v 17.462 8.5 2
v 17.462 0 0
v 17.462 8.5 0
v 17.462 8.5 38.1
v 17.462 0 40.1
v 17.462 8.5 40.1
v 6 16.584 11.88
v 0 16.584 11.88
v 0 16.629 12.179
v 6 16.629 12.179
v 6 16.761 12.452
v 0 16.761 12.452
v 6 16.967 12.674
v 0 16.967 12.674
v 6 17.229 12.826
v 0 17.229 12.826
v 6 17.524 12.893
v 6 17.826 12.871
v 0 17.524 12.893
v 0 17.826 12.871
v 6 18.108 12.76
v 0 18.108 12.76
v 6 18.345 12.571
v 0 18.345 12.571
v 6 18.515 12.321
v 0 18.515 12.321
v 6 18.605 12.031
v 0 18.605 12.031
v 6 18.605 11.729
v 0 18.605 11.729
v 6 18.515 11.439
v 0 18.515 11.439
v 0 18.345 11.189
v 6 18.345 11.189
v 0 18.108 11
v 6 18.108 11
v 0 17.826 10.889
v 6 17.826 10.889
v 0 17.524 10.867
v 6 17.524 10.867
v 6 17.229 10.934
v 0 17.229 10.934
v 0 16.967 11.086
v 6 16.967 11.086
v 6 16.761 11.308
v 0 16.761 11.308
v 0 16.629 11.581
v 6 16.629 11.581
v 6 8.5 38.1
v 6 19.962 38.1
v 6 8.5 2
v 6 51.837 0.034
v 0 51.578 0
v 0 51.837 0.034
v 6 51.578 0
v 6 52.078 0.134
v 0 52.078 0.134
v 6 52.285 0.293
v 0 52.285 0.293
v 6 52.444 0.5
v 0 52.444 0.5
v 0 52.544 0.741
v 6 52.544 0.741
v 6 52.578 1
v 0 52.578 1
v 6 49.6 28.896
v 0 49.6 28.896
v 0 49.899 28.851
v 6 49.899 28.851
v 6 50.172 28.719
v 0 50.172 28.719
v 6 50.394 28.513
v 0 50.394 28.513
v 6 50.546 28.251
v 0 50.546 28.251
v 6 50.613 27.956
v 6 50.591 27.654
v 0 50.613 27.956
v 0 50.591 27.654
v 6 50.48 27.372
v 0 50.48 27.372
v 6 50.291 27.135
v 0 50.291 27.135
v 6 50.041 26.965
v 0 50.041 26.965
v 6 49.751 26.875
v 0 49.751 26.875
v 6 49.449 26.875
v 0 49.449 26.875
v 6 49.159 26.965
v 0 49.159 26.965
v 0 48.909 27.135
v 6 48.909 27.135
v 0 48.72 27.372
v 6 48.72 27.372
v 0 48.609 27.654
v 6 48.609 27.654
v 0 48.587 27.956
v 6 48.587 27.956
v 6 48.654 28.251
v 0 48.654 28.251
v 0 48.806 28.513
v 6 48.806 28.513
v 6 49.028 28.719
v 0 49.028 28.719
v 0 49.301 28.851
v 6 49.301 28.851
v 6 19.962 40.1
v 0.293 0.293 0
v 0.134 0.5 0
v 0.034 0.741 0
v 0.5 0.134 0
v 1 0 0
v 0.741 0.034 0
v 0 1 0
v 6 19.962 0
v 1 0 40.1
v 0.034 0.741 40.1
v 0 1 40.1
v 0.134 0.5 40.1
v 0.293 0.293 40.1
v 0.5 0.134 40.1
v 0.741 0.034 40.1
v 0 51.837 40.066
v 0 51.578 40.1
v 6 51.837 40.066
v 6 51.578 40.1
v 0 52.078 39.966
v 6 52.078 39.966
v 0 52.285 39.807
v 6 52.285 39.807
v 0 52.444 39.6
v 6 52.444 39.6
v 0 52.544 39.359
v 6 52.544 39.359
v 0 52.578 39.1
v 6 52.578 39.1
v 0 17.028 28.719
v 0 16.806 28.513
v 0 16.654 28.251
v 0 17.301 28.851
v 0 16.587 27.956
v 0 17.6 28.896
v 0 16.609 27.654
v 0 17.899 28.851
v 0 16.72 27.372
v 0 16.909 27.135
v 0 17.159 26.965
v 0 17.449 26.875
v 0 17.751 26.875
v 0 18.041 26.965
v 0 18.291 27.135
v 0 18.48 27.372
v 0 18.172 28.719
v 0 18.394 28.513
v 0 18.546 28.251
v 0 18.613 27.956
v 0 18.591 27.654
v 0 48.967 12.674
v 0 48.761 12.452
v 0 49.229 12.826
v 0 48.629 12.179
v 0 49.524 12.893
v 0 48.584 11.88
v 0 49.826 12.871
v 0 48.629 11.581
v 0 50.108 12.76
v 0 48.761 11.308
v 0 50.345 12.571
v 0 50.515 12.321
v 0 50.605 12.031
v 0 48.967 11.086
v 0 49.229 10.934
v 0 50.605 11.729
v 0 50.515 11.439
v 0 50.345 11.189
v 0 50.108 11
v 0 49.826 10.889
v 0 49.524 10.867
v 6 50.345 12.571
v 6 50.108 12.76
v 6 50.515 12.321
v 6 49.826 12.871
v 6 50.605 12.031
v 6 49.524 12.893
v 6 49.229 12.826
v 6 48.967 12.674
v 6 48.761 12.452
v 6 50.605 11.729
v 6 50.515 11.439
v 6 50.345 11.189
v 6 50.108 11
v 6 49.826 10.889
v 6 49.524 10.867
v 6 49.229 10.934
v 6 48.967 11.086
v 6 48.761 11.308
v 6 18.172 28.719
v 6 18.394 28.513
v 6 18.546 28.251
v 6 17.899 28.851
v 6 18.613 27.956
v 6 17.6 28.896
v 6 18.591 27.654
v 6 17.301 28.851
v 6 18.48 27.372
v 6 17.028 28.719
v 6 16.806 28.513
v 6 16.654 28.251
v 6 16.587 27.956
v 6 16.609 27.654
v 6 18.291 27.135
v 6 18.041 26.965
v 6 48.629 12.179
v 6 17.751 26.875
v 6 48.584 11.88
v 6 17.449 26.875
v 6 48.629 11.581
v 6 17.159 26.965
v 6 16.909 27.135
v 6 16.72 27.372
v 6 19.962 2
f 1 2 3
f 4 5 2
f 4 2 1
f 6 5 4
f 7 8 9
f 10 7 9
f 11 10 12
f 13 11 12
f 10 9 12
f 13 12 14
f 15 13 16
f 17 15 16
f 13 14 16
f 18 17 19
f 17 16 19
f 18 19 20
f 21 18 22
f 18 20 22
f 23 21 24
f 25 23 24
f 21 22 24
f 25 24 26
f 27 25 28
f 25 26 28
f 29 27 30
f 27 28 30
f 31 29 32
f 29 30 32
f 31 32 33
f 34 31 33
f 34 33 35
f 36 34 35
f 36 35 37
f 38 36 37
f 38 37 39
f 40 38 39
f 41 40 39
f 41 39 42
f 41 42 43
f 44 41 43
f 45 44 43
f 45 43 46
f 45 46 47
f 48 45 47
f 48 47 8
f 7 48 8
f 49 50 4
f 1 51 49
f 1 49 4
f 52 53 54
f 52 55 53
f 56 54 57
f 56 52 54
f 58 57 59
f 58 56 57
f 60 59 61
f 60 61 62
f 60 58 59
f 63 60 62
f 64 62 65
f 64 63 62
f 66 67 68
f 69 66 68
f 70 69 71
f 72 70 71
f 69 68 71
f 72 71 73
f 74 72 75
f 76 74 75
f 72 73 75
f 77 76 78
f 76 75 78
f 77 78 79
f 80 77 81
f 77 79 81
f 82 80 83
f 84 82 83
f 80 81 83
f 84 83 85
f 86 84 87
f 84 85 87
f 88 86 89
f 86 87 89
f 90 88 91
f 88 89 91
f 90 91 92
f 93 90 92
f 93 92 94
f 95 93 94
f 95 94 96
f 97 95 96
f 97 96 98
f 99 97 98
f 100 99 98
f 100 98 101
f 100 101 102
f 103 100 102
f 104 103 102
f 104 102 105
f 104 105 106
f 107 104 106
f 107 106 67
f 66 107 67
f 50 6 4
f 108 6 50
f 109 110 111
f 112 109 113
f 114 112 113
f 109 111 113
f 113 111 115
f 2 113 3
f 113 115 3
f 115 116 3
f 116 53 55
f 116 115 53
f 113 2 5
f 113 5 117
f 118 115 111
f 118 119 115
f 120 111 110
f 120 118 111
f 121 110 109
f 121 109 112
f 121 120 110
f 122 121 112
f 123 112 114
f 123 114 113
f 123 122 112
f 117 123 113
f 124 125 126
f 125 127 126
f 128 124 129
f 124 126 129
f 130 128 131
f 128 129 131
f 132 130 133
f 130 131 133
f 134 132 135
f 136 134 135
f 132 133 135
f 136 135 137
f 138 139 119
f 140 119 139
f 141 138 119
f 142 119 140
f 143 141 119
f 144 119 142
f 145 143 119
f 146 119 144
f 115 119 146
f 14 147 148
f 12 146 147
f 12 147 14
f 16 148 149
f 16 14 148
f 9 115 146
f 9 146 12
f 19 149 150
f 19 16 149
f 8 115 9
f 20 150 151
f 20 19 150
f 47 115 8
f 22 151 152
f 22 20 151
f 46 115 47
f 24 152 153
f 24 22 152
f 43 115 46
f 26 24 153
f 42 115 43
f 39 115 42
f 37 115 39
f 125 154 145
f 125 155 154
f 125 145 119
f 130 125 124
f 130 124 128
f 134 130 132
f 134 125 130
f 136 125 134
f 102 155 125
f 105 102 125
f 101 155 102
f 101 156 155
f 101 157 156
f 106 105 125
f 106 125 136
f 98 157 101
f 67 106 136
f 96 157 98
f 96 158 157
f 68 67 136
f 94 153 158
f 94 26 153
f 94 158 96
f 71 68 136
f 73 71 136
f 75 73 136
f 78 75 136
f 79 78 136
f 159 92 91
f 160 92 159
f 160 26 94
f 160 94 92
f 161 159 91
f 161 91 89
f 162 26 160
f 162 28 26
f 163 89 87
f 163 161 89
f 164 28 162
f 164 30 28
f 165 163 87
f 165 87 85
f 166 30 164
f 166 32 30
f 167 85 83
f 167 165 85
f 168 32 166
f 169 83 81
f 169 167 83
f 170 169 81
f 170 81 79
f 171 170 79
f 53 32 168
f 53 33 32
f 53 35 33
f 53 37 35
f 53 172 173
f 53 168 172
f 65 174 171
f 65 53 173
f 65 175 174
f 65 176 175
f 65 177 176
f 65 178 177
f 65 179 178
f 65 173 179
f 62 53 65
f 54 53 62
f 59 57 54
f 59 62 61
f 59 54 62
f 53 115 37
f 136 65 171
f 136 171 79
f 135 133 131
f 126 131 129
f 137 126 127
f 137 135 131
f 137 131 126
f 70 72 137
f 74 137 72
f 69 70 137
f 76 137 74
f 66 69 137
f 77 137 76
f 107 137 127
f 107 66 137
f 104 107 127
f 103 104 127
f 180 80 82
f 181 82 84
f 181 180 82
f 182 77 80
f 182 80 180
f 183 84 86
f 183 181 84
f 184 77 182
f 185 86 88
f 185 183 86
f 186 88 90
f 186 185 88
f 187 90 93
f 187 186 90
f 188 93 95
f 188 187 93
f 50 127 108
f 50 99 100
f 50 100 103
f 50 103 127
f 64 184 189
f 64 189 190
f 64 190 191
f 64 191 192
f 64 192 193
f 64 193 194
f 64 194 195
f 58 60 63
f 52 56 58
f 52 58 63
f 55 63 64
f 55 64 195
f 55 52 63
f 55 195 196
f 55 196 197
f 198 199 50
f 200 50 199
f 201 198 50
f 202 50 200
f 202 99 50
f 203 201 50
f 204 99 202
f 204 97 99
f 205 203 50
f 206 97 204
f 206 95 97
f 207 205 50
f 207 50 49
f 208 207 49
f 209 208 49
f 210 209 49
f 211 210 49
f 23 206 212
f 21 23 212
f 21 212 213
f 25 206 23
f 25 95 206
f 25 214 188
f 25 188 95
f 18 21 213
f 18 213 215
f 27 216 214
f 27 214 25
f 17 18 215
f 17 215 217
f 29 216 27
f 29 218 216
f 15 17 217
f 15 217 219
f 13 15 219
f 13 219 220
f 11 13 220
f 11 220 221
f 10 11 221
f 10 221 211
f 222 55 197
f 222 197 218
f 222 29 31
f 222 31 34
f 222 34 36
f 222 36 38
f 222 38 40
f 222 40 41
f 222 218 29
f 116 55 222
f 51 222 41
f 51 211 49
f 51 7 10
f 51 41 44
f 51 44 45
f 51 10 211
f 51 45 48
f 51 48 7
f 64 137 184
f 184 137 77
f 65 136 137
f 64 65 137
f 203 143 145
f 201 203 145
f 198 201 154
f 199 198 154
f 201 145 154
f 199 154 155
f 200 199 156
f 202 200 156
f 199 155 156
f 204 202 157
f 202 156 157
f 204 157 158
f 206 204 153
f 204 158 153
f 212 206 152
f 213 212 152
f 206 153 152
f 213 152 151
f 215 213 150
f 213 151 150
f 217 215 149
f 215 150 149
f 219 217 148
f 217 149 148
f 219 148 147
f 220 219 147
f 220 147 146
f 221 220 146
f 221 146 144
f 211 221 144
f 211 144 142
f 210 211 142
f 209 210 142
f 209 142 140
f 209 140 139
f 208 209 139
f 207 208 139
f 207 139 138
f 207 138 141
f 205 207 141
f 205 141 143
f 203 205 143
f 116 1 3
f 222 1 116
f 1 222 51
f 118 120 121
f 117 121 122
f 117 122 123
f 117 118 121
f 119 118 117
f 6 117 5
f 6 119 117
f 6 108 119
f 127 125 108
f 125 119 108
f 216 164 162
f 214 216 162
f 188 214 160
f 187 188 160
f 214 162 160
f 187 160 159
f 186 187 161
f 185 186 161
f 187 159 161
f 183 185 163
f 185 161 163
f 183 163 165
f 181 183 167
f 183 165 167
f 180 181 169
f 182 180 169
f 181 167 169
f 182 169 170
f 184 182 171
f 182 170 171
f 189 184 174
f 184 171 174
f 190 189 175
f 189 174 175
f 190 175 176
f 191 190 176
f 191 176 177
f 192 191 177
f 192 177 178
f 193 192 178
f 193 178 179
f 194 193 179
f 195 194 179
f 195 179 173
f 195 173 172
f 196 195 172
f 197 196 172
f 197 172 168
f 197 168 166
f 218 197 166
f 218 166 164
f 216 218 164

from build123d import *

# Parameters (mm, degrees)
BOSS_EXTRUDE1_DEPTH = 40.1
SKETCH3_R           = 1.35
CUT_EXTRUDE2_DEPTH  = 50.8
SKETCH4_R           = 1.016
CUT_EXTRUDE3_DEPTH  = 50.8
SKETCH6_W           = 62.086073973
SKETCH6_H           = 34.1
CUT_EXTRUDE4_DEPTH  = 6
BOSS_EXTRUDE5_DEPTH = 2
FILLET1_R           = 1
CUT_EXTRUDE5_DEPTH  = 101.73954578


with BuildPart() as part:
    # Sketch1 → Boss-Extrude1 (new body)
    with BuildSketch(Plane.XY):
        Polygon((0, 0), (0, 52.578), (6, 52.578), (6, 8.5), (76, 8.5), (76, 0), align=None)
    extrude(amount=BOSS_EXTRUDE1_DEPTH)

    # Sketch3 → Cut-Extrude2 (cut)
    with BuildSketch(Plane.XY.offset(40.1)):
        with Locations((27.996, 2.8)):
            Circle(SKETCH3_R)
        with Locations((49.996, 2.8)):
            Circle(SKETCH3_R)
        with Locations((71.996, 2.8)):
            Circle(SKETCH3_R)
    extrude(amount=-CUT_EXTRUDE2_DEPTH, mode=Mode.SUBTRACT)

    # Sketch4 → Cut-Extrude3 (cut)
    with BuildSketch(Plane.ZY):
        with Locations((27.88, 17.6)):
            Circle(SKETCH4_R)
        with Locations(Location((11.88, 17.6, 0), (0, 0, 270))):
            Circle(SKETCH4_R)
        with Locations((27.88, 49.6)):
            Circle(SKETCH4_R)
        with Locations(Location((11.88, 49.6, 0), (0, 0, 270))):
            Circle(SKETCH4_R)
    extrude(amount=-CUT_EXTRUDE3_DEPTH, mode=Mode.SUBTRACT)

    # Sketch6 → Cut-Extrude4 (cut)
    with BuildSketch(Plane.XZ):
        with Locations((50.043036987, 20.05)):
            Rectangle(SKETCH6_W, SKETCH6_H)
    extrude(amount=-CUT_EXTRUDE4_DEPTH, mode=Mode.SUBTRACT)

    # Sketch16 → Boss-Extrude5 (add)
    with BuildSketch(Plane.XY.offset(40.1)):
        Polygon((6, 8.5), (26, 8.5), (6, 33.5), align=None)
    boss_extrude5 = extrude(amount=-BOSS_EXTRUDE5_DEPTH)

    # Mirror2: Boss-Extrude5 across plane
    add(boss_extrude5.mirror(Plane(origin=(0, 0, 20.05), x_dir=(1, 0, 0), z_dir=(0, 0, -1))))

    # Fillet1
    fillet1_edges = [part.edges().sort_by_distance(p)[0] for p in [
        (0, 0, 20.05),
        (76, 0, 38.6),
        (3, 52.578, 40.1),
        (76, 0, 1.5),
        (3, 52.578, 0),
    ]]
    fillet(fillet1_edges, radius=FILLET1_R)

    # Sketch17 → Cut-Extrude5 (cut, through all)
    with BuildSketch(Plane.XY.offset(40.1)):
        with BuildLine():
            Line((17.4625, 0), (17.4625, 8.5))
            Line((17.4625, 8.5), (6, 19.9625))
            Line((6, 19.9625), (6, 33.5))
            Line((6, 33.5), (26, 8.5))
            Line((26, 8.5), (76, 8.5))
            Line((76, 8.5), (76, 1))
            ThreePointArc((76, 1), (75.707106781, 0.292893219), (75, 0))
            Line((75, 0), (17.4625, 0))
        make_face()
    extrude(amount=-CUT_EXTRUDE5_DEPTH, mode=Mode.SUBTRACT)


solid = part.part
